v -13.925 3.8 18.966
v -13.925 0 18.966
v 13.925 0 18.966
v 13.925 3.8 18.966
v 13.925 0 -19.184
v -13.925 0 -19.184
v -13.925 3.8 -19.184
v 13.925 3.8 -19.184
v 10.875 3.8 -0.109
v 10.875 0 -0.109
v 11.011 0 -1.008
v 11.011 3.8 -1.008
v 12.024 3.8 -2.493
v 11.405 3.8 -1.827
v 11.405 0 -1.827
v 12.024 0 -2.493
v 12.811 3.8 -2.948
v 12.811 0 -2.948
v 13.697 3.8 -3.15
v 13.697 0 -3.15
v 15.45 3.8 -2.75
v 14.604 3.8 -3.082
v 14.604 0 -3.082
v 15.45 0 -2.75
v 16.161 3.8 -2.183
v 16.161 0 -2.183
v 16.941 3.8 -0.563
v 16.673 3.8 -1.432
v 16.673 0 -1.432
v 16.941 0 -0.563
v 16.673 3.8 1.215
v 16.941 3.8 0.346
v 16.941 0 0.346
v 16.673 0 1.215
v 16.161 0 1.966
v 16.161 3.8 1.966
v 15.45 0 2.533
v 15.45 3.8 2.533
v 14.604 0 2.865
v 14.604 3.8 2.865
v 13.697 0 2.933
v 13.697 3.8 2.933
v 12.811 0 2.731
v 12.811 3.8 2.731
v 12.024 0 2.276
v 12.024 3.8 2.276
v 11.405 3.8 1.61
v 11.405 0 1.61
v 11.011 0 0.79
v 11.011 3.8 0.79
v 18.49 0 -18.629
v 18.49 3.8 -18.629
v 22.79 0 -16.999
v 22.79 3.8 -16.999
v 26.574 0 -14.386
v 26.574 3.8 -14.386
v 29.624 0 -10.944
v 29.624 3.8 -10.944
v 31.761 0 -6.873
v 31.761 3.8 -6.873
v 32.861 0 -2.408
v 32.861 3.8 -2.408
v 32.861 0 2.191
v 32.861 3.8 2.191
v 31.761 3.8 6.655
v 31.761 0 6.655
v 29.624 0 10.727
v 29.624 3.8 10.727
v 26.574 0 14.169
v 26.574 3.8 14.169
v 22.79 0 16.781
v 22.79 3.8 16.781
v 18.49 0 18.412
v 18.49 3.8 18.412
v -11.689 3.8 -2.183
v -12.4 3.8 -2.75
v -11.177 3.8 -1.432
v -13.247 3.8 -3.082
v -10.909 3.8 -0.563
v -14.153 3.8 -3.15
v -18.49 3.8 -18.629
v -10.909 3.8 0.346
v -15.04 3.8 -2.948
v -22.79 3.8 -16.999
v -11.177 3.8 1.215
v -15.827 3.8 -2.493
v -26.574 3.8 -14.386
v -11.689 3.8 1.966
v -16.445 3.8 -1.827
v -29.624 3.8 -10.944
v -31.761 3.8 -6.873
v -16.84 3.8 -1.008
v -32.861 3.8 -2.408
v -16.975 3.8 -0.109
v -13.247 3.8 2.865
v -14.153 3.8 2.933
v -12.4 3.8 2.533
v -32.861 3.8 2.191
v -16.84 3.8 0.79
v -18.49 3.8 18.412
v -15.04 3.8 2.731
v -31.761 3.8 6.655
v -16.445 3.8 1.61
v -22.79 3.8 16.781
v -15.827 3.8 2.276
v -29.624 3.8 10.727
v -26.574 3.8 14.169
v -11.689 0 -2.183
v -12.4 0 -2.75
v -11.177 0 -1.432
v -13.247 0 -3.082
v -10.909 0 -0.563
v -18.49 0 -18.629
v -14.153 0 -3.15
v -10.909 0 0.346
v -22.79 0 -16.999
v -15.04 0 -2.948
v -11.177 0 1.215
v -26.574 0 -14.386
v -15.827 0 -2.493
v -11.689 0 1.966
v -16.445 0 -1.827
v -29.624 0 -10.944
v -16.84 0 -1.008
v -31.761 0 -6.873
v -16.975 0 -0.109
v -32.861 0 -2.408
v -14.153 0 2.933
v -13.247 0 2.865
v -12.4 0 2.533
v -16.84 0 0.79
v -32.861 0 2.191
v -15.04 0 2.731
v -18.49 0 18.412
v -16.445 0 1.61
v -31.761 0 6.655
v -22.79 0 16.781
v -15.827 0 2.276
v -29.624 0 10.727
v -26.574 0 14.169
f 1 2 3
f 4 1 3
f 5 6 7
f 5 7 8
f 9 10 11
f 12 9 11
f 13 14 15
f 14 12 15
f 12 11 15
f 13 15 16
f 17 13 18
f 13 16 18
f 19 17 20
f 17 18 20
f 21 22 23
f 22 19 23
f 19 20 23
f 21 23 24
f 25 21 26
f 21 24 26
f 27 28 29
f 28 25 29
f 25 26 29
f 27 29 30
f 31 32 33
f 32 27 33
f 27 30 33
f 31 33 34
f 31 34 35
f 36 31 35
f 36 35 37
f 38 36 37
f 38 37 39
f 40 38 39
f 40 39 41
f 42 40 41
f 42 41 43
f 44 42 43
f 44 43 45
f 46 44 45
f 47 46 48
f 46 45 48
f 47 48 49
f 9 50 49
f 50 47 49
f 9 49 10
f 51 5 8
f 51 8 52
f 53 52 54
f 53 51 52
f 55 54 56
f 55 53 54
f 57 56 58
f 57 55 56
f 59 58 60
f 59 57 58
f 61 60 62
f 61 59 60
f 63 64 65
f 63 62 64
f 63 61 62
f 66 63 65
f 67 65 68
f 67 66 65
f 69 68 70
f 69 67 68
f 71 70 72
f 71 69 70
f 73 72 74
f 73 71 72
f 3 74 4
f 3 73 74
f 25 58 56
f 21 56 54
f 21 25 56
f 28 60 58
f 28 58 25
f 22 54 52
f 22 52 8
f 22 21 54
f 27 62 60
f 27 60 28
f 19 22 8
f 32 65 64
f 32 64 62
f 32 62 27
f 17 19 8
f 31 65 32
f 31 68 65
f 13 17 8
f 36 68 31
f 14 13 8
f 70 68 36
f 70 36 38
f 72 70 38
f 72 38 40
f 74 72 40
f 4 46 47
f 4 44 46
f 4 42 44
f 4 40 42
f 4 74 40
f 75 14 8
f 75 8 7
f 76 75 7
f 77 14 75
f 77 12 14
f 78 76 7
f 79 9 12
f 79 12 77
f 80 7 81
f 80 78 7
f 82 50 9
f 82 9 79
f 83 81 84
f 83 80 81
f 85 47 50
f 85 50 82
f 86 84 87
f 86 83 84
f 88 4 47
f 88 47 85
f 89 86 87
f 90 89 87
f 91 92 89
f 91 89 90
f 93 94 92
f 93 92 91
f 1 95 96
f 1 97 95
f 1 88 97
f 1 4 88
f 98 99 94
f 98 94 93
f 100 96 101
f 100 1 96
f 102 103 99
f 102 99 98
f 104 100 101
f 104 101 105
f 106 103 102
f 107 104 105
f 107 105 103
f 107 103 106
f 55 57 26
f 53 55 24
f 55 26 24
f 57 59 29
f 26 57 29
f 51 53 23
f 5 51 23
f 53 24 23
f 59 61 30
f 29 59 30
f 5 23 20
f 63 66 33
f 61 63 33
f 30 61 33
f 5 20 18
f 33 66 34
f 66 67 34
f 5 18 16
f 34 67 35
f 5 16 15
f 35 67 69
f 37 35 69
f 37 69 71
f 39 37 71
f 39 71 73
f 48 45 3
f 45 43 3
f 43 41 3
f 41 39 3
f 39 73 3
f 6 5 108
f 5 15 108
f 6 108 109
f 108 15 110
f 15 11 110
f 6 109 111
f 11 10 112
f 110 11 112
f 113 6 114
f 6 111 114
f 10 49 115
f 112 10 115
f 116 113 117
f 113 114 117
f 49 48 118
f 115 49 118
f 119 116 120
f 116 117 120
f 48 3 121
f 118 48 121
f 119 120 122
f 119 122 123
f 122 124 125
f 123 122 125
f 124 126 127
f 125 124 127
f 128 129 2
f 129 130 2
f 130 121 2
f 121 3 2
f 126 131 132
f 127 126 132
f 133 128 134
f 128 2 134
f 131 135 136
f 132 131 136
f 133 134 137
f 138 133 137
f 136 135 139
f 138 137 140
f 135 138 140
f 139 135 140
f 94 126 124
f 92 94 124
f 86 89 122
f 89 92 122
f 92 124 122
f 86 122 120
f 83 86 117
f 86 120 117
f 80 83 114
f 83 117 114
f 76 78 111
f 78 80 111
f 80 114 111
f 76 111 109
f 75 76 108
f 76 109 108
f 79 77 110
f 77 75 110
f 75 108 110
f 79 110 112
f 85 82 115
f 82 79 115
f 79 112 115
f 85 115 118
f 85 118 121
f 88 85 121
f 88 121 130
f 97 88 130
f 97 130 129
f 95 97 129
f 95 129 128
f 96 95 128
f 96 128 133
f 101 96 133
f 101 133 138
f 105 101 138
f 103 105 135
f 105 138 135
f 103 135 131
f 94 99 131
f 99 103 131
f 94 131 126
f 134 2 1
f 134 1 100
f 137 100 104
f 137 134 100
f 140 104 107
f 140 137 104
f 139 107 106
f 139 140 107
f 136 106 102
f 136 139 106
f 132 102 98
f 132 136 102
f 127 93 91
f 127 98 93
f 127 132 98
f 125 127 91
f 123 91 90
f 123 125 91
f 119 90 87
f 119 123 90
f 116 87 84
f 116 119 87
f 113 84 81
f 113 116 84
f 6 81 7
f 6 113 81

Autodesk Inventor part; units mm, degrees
ref_plane "YZ Plane" through (0, 0, 0) normal (1, 0, 0) x (0, 1, 0)
ref_plane "XZ Plane" through (0, 0, 0) normal (0, 1, 0) x (-1, 0, 0)
ref_plane "XY Plane" through (0, 0, 0) normal (0, 0, 1) x (1, 0, 0)
sketch "Sketch1" plane through (0, 0, 0) normal (0, 1, 0) x (-1, 0, 0)
  arc A0 (13.9253, -19.1836) -> (13.9253, 18.9664) centre (13.9253, -0.1086) ccw
  arc A1 (-13.9253, 18.9664) -> (-13.9253, -19.1836) centre (-13.9253, -0.1086) ccw
  line L0 (33, 0) -> (-33, 0) construction
  line L1 (13.9253, 18.9664) -> (-13.9253, 18.9664)
  line L2 (14.2135, -19.1836) -> (-13.9253, -19.1836)
  line L3 (-13.9253, -0.1086) -> (-13.9253, 18.9664) construction
  line L4 (-13.9253, -0.1086) -> (-13.9253, -19.1836) construction
  line L5 (13.9253, 18.9664) -> (13.9253, -19.1836) construction
  circle A2 centre (13.9253, -0.1086) radius 3.05
  circle A3 centre (-13.9253, -0.1086) radius 3.05
  point P0 (0, 0)
  point P1 (0, 0)
  dimension "d0" = 38.15
  dimension "d1" = 66
  dimension "d4" = 27.8506
  dimension "d7" = 6.1
extrude "Extrusion1" add sketch "Sketch1" along normal blind 3.8
properties part number "hinge" material "Steel, Carbon"
